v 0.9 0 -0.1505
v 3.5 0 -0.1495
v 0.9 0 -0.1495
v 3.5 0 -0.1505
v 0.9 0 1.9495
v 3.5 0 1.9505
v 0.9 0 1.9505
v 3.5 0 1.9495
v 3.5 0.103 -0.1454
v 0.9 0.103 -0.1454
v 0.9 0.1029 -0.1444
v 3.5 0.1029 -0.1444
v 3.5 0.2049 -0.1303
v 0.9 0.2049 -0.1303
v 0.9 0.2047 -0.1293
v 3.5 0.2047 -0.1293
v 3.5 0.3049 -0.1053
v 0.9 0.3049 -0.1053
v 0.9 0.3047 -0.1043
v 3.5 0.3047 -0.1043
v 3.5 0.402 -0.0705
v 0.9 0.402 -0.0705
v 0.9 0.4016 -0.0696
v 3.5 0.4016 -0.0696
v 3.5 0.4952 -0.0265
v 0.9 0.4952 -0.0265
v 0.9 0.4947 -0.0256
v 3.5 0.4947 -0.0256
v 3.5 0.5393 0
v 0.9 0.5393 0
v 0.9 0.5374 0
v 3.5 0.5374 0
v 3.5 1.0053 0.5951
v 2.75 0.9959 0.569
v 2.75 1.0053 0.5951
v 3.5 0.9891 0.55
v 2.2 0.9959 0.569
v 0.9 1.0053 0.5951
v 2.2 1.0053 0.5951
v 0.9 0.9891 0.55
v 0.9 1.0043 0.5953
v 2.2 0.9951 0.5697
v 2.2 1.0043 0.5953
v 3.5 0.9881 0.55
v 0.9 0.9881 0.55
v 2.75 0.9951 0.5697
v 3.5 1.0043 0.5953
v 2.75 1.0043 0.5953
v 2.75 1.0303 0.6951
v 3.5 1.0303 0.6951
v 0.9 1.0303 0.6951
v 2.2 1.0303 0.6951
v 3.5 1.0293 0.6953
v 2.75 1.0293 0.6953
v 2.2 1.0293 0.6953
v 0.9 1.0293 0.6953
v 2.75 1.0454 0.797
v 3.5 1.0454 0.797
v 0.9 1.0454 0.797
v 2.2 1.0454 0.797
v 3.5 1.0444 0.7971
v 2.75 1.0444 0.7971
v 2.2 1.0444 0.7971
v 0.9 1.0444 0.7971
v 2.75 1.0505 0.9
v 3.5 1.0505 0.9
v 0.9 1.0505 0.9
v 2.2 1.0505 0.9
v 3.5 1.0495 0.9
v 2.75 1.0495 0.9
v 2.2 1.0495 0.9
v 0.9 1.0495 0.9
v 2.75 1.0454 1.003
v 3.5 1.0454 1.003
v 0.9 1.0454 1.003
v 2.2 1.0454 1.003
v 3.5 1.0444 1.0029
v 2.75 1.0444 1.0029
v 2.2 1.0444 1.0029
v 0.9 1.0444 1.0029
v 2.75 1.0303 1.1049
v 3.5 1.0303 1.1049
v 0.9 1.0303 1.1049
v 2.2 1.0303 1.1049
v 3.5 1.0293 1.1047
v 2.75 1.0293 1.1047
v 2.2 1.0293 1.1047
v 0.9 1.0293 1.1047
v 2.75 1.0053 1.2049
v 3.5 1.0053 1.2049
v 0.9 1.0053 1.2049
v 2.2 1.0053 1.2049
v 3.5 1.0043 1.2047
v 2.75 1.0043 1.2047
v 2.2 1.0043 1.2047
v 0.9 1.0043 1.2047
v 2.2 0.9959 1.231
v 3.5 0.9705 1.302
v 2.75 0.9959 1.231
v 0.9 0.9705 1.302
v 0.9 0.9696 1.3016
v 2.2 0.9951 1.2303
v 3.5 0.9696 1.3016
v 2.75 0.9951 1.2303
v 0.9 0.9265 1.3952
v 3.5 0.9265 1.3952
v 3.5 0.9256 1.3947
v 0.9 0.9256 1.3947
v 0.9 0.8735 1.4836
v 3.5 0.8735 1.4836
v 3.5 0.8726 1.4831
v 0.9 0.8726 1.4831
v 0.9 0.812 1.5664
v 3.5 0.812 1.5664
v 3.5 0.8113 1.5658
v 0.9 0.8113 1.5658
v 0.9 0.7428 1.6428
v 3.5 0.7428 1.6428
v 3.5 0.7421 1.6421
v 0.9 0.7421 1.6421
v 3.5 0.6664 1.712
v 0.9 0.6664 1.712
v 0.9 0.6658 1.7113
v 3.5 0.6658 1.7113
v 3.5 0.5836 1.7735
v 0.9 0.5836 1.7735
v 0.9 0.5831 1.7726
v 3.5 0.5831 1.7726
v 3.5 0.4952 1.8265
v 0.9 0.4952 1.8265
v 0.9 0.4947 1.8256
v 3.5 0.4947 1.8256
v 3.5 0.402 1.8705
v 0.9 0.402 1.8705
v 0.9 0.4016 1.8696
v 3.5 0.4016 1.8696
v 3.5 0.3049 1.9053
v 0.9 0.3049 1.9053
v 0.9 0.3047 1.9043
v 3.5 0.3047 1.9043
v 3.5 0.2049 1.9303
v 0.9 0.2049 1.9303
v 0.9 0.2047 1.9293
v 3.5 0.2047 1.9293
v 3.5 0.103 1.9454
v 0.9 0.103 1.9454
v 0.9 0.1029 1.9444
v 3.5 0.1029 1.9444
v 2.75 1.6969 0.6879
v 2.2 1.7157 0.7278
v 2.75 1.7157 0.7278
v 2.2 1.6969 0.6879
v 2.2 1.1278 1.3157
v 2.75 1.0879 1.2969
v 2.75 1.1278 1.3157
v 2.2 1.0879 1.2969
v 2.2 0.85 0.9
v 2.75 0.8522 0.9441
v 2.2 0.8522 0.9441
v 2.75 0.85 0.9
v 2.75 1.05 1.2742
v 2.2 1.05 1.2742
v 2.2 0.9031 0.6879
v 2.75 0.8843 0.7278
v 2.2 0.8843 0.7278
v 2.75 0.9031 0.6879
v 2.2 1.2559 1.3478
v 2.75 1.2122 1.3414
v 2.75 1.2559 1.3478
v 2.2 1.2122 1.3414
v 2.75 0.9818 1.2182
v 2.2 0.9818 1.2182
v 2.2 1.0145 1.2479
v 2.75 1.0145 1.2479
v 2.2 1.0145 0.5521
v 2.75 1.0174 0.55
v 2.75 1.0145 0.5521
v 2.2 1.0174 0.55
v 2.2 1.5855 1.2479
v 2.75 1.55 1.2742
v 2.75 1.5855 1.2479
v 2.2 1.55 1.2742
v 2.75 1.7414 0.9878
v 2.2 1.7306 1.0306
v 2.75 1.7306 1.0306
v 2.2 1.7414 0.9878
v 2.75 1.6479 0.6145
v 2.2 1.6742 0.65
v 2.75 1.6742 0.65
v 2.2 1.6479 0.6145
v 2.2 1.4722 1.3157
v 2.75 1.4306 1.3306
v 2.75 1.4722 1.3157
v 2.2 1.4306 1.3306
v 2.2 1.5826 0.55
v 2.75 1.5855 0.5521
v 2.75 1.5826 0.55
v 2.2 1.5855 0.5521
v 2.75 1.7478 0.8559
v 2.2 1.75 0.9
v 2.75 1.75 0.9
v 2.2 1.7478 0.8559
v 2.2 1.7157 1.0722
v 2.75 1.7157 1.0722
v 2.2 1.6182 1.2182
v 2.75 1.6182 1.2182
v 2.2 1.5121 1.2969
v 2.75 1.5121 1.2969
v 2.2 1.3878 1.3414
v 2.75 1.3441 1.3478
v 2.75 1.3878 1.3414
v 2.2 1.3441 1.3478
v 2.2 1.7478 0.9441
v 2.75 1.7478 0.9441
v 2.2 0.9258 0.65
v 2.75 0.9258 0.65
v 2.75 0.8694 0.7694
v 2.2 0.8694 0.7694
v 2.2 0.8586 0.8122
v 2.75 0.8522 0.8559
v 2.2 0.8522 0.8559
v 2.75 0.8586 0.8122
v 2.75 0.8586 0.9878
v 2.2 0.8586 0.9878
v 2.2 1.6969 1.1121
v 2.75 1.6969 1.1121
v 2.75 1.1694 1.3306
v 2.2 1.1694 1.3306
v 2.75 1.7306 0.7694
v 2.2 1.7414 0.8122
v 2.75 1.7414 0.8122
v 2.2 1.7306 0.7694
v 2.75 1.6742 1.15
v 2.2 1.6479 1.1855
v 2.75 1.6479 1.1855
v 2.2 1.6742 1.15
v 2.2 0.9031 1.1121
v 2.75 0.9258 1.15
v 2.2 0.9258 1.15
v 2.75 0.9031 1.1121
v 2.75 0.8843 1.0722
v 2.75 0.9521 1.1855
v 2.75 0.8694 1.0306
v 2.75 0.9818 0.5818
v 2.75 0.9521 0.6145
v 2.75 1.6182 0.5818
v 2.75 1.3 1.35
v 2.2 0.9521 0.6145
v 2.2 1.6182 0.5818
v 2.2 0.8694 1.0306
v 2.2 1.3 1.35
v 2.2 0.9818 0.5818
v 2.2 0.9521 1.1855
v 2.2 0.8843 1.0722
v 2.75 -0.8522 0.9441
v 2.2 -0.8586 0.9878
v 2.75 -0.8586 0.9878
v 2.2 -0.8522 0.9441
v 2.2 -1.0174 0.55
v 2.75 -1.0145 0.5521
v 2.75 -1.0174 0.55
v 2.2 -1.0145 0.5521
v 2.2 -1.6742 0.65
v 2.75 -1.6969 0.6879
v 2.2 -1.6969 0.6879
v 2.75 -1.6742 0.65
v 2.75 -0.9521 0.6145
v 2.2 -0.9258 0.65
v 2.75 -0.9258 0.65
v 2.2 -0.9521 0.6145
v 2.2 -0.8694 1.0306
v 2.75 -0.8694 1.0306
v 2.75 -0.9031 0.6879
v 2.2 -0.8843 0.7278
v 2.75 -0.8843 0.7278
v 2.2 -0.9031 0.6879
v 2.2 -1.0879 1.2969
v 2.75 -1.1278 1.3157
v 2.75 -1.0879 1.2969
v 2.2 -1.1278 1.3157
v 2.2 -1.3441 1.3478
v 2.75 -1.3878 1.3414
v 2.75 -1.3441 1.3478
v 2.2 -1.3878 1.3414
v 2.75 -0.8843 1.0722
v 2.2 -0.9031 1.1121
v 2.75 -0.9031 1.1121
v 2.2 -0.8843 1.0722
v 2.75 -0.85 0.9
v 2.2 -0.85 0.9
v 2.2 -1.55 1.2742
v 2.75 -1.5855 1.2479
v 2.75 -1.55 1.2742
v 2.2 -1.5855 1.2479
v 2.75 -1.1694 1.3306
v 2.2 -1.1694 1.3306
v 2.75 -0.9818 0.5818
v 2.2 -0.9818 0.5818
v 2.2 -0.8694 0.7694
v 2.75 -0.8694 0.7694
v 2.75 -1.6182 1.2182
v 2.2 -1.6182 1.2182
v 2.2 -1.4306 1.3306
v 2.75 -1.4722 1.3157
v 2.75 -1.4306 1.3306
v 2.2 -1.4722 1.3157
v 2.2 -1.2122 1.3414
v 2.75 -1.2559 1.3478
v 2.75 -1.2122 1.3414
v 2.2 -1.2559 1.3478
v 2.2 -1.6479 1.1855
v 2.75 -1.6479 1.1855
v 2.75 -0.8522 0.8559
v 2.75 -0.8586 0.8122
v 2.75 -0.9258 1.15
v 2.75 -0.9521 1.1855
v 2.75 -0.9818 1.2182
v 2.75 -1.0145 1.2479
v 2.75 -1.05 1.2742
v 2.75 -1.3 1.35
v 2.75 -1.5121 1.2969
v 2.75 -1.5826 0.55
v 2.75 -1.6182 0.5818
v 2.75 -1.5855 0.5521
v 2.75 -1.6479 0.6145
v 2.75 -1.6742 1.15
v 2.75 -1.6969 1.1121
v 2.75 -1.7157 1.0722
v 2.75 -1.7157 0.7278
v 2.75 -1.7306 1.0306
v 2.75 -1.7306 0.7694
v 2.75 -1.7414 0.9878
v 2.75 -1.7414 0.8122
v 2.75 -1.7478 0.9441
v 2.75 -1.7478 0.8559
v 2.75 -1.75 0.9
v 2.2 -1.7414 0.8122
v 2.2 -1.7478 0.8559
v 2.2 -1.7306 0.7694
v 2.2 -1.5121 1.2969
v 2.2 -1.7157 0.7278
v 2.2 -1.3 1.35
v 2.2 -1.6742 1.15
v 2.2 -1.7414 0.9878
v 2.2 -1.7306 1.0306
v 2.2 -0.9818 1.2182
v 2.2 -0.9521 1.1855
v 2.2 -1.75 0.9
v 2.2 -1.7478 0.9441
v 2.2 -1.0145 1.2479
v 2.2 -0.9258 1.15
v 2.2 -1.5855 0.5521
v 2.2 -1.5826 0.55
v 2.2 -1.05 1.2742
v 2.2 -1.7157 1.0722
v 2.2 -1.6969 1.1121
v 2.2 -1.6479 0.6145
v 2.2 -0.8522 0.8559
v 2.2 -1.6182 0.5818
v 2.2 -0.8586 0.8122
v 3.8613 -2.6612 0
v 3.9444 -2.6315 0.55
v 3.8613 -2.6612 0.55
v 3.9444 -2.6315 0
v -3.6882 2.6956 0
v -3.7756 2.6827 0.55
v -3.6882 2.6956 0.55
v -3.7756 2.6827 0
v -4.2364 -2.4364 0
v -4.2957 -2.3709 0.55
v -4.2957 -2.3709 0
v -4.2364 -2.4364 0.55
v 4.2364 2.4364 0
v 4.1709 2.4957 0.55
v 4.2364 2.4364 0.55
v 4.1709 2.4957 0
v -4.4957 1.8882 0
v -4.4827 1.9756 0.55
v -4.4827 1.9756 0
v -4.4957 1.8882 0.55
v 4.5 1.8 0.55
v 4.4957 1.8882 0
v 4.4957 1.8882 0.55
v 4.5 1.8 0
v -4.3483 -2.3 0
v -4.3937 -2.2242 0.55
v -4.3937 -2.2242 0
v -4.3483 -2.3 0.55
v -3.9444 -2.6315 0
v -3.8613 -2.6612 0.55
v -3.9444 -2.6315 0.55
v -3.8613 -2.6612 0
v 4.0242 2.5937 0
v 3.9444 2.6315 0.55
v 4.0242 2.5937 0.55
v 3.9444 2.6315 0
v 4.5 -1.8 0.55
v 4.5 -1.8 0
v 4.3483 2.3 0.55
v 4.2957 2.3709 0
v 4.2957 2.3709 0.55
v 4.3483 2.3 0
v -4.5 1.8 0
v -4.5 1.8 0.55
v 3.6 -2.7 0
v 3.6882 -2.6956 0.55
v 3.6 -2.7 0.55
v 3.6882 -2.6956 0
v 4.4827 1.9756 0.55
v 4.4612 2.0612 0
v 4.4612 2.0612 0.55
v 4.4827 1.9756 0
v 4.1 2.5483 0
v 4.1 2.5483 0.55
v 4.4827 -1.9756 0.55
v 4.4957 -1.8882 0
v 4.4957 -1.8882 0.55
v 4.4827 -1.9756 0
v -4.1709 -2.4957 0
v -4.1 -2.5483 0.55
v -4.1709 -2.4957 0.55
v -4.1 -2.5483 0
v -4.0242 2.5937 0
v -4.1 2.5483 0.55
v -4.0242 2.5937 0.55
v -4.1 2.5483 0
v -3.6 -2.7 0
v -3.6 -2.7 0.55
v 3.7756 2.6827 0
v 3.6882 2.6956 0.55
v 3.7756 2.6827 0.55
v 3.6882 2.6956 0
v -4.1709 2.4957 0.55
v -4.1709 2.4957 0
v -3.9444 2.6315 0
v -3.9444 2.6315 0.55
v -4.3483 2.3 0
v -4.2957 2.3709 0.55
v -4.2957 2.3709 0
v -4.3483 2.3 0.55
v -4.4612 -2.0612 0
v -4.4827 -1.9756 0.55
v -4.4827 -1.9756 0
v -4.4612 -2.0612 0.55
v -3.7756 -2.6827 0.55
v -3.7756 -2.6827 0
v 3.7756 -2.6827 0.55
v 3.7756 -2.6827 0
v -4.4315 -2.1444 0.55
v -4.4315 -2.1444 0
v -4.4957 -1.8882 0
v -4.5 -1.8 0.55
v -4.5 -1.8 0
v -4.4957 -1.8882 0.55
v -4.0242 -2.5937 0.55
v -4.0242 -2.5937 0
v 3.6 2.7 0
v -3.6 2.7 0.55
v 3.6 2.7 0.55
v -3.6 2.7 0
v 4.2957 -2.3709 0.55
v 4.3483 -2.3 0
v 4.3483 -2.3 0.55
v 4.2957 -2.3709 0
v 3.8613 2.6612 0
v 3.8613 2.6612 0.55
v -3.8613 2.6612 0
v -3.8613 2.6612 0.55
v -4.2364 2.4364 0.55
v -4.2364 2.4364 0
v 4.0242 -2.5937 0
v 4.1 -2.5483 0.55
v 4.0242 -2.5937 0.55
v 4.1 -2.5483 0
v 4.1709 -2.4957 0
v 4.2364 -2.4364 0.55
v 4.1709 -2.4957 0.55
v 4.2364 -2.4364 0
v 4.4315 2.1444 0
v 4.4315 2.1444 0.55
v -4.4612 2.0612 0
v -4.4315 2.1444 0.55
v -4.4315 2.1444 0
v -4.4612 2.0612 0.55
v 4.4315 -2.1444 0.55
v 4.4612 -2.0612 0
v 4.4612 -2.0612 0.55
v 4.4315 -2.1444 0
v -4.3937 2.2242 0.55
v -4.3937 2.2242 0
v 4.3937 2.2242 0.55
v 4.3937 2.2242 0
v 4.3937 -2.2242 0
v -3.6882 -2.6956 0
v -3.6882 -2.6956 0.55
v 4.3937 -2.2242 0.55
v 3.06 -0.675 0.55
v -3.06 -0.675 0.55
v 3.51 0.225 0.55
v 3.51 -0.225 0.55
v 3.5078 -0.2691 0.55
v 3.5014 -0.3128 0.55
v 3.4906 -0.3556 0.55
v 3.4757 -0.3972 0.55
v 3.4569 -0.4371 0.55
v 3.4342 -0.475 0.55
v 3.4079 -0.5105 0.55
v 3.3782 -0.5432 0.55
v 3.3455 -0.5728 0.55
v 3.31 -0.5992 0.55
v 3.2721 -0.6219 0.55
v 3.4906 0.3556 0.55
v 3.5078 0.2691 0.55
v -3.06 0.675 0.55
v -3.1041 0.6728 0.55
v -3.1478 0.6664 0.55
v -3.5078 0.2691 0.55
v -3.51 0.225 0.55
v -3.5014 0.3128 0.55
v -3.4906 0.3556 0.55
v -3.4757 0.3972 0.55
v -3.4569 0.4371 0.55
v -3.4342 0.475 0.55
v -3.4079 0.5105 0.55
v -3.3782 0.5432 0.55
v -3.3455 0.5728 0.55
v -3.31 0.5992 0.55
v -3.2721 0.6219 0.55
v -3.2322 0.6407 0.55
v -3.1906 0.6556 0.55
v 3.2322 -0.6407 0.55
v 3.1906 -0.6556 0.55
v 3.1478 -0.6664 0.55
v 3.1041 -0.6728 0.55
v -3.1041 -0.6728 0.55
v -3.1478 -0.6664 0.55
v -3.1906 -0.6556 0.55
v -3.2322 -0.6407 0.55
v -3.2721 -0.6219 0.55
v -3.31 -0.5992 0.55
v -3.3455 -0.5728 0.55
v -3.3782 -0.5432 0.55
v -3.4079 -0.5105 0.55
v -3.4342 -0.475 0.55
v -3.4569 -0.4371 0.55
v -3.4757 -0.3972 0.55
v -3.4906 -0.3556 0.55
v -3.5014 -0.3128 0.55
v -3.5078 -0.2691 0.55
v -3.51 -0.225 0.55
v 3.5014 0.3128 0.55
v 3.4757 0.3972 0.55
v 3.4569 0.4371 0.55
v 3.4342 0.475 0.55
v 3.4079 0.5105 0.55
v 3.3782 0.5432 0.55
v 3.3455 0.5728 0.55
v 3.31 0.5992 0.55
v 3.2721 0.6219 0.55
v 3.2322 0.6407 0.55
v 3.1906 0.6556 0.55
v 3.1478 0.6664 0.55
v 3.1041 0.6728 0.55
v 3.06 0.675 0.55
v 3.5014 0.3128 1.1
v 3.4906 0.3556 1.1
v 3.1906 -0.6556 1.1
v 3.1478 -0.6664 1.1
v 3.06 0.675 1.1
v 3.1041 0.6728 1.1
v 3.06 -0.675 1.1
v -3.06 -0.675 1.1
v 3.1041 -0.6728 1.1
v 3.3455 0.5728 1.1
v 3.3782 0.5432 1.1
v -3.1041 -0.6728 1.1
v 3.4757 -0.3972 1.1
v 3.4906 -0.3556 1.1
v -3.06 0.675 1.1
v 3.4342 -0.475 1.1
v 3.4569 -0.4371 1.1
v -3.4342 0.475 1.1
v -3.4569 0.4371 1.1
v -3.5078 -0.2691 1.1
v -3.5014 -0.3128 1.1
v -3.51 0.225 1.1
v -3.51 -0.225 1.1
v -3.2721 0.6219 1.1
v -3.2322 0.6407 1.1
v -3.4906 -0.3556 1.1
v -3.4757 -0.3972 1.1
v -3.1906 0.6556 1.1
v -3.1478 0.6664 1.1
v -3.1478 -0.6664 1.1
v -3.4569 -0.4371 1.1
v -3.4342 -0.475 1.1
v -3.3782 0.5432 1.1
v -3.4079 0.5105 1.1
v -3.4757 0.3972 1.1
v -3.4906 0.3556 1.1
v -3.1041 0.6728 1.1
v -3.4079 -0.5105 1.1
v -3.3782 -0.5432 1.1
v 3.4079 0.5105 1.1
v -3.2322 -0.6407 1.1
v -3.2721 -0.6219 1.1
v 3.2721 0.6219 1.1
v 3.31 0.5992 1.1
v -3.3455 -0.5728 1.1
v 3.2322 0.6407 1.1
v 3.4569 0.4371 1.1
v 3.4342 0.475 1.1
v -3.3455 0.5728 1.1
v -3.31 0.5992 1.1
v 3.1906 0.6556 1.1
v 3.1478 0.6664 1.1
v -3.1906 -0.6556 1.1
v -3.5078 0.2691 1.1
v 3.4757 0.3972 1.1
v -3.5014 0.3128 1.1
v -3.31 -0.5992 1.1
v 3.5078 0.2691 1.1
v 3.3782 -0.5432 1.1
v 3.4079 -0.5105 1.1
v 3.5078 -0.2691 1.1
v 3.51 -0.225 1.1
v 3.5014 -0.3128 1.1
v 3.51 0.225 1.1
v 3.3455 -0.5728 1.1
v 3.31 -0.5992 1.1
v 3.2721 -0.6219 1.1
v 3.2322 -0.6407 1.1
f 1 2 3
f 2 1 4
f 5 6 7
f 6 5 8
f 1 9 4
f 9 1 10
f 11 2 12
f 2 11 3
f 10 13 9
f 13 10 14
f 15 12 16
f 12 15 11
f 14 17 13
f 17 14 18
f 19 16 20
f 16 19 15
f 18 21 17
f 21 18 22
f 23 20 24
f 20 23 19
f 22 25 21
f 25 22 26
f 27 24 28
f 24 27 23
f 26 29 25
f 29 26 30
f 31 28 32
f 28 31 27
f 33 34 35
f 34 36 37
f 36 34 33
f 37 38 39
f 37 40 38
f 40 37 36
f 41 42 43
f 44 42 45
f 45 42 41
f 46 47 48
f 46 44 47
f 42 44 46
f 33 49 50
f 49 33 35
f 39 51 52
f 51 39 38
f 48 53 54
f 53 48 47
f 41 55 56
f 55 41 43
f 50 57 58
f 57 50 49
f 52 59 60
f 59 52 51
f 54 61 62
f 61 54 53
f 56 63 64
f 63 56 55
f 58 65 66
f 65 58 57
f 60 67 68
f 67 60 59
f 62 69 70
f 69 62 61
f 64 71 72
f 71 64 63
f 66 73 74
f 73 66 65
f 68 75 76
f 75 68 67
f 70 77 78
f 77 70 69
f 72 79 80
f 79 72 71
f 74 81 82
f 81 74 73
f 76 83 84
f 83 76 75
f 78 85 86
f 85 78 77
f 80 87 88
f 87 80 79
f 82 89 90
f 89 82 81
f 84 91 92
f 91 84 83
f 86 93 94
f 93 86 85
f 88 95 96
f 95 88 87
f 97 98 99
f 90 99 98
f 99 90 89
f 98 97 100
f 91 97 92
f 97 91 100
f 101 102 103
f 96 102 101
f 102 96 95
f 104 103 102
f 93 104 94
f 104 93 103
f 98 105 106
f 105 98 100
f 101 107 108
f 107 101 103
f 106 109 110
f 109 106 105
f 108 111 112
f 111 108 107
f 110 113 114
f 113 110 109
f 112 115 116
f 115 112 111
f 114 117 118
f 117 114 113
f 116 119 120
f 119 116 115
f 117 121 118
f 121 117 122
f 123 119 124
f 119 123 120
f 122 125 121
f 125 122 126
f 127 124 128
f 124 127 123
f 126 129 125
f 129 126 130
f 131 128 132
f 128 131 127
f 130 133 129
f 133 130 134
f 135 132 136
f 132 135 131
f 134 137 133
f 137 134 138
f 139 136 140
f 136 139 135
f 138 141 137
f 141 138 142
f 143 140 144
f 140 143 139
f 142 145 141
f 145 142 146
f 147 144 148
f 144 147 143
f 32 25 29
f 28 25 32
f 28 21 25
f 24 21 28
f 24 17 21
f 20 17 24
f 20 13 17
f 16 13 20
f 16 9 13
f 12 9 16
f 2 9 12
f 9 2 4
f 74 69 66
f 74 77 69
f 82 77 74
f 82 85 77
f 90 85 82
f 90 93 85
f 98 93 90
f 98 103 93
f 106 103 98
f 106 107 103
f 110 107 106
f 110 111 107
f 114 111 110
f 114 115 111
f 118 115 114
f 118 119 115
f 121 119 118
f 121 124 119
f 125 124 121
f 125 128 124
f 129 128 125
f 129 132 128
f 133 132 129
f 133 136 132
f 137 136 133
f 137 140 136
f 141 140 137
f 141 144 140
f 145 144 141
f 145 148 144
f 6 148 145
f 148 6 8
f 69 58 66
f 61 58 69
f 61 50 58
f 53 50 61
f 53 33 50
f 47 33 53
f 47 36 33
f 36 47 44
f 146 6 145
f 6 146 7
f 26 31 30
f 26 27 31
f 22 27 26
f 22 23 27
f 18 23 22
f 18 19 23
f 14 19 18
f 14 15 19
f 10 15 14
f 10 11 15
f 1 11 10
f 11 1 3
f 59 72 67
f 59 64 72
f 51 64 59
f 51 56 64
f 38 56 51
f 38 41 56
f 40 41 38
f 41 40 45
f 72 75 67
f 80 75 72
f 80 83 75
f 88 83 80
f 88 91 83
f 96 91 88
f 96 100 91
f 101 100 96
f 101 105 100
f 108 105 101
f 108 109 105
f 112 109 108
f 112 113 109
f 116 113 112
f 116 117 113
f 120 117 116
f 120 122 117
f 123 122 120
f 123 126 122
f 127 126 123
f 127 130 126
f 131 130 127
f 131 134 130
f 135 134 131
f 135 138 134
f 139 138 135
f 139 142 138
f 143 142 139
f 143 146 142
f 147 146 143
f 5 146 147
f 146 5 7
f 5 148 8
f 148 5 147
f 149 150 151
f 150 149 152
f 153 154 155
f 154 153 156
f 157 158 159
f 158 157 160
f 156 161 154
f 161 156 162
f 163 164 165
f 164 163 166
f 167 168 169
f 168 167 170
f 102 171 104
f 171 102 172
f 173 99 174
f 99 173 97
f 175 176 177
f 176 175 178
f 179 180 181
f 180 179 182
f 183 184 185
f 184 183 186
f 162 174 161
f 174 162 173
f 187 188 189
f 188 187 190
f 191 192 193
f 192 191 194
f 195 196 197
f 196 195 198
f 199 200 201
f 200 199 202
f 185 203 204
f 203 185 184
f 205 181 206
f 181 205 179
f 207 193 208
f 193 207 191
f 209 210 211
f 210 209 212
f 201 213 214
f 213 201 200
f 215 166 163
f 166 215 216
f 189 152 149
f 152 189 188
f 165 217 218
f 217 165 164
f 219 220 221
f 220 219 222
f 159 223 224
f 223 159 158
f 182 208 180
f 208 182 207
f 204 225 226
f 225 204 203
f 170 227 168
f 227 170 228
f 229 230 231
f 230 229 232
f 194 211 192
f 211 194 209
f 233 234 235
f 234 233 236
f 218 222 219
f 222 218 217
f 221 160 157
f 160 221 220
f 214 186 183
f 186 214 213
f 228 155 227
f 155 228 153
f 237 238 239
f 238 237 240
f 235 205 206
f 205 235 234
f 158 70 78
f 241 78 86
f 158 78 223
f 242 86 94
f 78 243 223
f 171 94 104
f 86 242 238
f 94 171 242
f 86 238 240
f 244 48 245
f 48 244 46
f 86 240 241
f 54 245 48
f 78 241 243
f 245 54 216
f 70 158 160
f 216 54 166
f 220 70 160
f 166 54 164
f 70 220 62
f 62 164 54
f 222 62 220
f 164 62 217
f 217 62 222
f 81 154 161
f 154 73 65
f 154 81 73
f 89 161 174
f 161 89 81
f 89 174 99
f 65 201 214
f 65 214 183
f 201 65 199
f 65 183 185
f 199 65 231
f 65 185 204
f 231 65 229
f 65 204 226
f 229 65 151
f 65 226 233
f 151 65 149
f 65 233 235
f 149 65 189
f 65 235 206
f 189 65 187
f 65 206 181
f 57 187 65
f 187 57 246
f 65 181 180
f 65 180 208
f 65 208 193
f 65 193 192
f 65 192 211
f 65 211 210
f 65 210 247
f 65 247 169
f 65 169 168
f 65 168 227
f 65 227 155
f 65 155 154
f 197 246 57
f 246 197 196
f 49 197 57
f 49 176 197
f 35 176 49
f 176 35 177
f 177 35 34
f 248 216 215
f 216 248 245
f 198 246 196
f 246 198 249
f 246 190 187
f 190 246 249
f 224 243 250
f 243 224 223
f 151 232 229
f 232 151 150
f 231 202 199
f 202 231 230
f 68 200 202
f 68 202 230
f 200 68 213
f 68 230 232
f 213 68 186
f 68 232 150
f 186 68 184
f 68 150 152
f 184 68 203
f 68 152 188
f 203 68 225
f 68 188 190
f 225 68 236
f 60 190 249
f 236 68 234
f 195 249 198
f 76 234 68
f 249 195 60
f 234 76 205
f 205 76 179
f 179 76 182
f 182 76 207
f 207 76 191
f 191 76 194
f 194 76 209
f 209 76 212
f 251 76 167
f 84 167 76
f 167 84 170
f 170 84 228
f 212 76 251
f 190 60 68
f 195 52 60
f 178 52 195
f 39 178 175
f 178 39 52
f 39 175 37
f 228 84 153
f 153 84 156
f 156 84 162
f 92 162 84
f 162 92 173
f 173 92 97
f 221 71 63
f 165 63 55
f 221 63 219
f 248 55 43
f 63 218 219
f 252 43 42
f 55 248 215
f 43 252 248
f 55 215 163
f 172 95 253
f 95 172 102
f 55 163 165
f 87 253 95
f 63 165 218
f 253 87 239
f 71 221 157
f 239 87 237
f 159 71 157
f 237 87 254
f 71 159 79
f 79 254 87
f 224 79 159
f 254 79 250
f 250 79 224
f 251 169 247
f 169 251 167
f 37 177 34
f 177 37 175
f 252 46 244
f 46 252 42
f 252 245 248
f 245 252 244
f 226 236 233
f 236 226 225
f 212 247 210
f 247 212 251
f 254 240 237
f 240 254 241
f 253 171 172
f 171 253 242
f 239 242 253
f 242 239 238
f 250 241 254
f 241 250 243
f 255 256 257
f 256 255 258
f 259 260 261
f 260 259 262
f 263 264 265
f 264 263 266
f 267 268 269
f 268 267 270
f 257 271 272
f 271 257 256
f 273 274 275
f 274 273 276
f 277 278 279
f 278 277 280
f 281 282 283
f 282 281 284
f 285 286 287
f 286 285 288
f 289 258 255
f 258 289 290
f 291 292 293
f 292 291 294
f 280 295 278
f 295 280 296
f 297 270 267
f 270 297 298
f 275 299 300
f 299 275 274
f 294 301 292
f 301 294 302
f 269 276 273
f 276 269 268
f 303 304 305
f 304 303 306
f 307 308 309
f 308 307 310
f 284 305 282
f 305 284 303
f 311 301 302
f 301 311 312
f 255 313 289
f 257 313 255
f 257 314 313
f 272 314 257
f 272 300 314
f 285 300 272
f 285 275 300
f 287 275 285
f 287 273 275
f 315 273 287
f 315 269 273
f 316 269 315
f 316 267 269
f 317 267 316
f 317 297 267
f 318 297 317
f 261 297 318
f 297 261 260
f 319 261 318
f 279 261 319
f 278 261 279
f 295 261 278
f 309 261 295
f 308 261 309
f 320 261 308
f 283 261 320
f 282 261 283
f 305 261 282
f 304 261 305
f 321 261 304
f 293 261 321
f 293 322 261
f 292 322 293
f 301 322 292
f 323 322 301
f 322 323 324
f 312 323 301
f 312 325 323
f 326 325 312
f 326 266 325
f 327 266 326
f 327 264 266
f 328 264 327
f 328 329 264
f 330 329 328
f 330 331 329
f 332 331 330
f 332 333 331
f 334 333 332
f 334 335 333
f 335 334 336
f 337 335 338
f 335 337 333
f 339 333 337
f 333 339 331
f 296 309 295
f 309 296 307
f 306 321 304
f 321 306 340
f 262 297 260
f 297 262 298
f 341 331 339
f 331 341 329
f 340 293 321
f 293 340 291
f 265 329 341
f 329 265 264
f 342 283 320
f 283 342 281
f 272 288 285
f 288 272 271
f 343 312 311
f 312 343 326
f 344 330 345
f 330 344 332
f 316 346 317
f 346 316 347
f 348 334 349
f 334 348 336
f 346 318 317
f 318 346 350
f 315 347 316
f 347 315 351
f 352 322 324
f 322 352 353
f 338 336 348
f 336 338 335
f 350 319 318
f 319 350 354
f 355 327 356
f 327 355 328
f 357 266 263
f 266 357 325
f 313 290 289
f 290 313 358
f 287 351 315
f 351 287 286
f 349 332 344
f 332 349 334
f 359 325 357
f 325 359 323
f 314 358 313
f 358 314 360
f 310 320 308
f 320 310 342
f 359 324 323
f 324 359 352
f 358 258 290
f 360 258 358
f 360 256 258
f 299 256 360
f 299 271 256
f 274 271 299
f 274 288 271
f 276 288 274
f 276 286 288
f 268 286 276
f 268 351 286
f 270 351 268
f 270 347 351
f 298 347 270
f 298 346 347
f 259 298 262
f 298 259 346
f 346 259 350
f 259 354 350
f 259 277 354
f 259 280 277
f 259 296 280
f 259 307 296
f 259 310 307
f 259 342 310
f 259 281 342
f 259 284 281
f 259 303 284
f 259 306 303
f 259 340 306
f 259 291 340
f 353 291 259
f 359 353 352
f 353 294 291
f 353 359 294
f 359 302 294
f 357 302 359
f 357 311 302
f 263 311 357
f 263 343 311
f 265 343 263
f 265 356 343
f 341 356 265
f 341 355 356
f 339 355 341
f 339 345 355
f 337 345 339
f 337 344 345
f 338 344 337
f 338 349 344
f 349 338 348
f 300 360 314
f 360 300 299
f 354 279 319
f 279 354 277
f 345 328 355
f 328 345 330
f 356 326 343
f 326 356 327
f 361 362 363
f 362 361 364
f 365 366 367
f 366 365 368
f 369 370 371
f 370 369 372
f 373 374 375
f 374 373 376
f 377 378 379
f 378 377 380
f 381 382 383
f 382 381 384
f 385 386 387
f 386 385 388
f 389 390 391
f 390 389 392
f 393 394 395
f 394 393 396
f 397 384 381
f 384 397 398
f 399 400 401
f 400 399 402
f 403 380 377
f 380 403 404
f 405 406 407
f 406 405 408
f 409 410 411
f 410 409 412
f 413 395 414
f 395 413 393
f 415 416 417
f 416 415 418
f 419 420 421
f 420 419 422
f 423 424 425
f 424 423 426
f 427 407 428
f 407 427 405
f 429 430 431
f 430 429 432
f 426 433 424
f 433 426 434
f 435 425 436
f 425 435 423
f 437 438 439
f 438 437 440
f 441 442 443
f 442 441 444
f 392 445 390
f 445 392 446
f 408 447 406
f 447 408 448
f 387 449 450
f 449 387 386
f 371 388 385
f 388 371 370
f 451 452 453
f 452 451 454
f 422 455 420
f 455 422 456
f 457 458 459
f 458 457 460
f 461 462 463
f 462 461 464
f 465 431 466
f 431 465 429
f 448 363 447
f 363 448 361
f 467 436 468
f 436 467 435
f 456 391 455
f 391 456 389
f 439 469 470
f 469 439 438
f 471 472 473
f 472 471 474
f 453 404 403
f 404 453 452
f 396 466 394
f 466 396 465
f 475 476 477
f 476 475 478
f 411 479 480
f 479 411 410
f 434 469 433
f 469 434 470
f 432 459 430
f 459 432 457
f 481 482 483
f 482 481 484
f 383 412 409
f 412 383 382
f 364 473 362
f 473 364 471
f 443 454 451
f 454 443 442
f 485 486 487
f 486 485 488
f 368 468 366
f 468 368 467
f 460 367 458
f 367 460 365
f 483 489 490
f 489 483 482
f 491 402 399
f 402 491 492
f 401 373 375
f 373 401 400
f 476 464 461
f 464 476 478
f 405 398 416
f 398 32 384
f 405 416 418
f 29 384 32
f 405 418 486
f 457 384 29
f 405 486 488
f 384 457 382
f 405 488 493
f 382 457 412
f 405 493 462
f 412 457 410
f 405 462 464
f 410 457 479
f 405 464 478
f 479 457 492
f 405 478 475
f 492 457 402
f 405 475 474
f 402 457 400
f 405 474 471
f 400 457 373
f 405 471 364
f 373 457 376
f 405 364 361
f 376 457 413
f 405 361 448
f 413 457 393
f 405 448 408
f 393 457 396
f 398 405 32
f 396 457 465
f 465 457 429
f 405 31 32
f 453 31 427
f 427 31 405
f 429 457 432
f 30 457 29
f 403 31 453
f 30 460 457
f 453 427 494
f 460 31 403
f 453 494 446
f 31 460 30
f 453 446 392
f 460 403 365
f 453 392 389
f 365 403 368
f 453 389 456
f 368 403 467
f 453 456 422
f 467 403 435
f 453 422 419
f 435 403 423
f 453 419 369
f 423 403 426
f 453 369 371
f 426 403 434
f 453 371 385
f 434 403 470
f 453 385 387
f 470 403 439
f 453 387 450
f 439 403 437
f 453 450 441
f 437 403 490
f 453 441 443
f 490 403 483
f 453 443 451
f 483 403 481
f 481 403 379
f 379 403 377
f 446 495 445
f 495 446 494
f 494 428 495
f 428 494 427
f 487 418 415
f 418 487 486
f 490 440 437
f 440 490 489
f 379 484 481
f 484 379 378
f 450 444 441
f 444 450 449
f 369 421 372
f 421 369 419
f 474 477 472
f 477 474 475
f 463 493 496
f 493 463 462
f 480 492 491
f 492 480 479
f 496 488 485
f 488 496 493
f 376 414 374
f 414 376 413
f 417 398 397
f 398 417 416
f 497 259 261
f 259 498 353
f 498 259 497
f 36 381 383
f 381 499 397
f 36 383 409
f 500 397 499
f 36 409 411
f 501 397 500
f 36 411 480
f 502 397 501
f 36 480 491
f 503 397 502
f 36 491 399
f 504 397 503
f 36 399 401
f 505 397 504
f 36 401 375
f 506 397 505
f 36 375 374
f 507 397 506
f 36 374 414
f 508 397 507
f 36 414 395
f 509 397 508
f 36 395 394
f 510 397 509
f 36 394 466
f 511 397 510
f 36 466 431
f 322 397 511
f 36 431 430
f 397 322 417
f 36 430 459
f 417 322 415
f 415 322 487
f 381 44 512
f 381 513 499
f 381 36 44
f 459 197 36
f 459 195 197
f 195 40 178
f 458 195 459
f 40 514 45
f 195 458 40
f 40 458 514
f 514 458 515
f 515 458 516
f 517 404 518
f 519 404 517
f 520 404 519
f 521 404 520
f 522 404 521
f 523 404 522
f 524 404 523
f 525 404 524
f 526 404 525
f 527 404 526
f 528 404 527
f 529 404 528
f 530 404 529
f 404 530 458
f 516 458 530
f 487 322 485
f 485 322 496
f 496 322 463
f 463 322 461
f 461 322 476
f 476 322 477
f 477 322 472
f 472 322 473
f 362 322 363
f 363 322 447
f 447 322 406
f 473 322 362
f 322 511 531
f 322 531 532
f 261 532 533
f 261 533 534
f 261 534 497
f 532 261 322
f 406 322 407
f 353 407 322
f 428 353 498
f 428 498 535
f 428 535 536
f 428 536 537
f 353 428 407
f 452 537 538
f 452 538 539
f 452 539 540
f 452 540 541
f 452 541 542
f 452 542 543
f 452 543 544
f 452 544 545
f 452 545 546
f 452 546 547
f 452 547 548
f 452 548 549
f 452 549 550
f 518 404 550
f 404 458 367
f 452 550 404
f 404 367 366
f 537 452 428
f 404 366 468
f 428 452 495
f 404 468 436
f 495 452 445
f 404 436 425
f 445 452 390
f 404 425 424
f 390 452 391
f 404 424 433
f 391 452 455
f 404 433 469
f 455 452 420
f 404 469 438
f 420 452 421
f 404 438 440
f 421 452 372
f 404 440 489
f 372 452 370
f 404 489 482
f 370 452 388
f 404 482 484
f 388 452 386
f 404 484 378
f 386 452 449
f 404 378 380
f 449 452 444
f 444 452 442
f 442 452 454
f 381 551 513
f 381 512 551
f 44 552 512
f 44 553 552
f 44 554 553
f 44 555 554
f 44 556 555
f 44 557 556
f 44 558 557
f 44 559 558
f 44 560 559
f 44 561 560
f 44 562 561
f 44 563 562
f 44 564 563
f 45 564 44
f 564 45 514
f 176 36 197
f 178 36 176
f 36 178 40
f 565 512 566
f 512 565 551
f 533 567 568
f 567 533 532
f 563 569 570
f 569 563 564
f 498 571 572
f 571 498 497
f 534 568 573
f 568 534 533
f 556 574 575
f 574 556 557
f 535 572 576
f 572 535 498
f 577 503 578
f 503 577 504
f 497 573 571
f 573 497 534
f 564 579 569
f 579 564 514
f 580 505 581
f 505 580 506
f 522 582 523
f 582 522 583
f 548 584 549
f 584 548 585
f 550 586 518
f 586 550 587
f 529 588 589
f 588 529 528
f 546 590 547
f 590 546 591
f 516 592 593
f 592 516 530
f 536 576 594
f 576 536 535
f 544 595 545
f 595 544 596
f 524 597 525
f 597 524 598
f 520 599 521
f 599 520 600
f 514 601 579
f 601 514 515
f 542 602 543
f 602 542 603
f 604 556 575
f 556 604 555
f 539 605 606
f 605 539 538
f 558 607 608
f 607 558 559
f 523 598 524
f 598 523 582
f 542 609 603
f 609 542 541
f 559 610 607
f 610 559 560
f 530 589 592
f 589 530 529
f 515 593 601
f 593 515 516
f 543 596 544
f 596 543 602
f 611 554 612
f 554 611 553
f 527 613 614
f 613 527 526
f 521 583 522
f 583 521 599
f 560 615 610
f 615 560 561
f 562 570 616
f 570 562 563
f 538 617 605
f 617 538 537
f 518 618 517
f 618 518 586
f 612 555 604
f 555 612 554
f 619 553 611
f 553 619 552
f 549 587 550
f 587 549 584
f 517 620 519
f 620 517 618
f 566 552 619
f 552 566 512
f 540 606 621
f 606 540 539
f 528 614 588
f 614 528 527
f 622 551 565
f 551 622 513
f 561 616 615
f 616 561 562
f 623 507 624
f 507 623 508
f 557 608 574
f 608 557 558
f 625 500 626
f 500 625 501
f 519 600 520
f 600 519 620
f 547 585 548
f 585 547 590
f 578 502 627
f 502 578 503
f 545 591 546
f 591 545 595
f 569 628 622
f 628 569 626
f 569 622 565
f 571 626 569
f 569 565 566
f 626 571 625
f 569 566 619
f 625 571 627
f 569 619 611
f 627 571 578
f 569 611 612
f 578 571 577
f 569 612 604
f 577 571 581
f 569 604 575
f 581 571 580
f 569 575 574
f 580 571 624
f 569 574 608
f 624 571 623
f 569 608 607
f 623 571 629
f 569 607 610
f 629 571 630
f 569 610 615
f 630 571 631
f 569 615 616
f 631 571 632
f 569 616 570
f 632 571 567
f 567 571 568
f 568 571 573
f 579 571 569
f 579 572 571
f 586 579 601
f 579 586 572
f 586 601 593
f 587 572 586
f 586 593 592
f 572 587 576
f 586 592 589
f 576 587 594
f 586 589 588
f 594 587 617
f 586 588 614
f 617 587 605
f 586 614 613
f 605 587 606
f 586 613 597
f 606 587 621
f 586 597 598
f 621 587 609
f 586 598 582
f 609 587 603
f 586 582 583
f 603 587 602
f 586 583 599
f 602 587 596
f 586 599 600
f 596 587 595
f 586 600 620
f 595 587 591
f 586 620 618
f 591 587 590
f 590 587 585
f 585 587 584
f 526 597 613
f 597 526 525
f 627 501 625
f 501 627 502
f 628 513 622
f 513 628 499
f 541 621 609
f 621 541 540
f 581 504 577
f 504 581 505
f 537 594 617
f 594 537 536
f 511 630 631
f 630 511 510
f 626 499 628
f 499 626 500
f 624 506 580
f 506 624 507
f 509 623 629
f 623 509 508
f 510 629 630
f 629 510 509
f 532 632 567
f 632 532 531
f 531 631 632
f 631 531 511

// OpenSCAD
$fn=64;

L = 9.0;   // overall length (elongated axis, X)
W = 5.4;   // overall width (Y)
H = 1.4;   // overall height (Z)

base_t = 0.55;
base_r = 0.9;

spine_w = 1.35;
spine_h = 0.55;
spine_r = 0.45;

cradle_outer_r = 1.05;
cradle_inner_r = 0.65;
cradle_w = 2.6;
cradle_x = 2.2;
cradle_z = base_t + 0.35;

nub_r = 0.45;
nub_len = 0.55;

module rounded_plate(l, w, t, r){
    linear_extrude(height=t)
        offset(r=r)
            square([l-2*r, w-2*r], center=true);
}

module rounded_spine(l, w, h, r){
    translate([0,0,base_t])
        linear_extrude(height=h)
            offset(r=r)
                square([l-2*r, w-2*r], center=true);
}

module u_cradle(){
    translate([cradle_x, 0, cradle_z])
    rotate([0,90,0])
    difference(){
        rotate_extrude(angle=180, convexity=10)
            translate([cradle_outer_r,0,0])
                square([0.001, cradle_w], center=true);
        rotate_extrude(angle=180, convexity=10)
            translate([cradle_inner_r,0,0])
                square([0.001, cradle_w+0.2], center=true);
    }
}

module end_nubs(){
    translate([cradle_x, 0, cradle_z])
    rotate([0,90,0]){
        translate([0,  cradle_w/2, 0])
            cylinder(h=nub_len, r=nub_r, center=false);
        translate([0, -cradle_w/2, 0])
            cylinder(h=nub_len, r=nub_r, center=false);
    }
}

module clip(){
    union(){
        rounded_plate(L, W, base_t, base_r);
        rounded_spine(L*0.78, spine_w, spine_h, spine_r);
        u_cradle();
        end_nubs();
    }
}

clip();
